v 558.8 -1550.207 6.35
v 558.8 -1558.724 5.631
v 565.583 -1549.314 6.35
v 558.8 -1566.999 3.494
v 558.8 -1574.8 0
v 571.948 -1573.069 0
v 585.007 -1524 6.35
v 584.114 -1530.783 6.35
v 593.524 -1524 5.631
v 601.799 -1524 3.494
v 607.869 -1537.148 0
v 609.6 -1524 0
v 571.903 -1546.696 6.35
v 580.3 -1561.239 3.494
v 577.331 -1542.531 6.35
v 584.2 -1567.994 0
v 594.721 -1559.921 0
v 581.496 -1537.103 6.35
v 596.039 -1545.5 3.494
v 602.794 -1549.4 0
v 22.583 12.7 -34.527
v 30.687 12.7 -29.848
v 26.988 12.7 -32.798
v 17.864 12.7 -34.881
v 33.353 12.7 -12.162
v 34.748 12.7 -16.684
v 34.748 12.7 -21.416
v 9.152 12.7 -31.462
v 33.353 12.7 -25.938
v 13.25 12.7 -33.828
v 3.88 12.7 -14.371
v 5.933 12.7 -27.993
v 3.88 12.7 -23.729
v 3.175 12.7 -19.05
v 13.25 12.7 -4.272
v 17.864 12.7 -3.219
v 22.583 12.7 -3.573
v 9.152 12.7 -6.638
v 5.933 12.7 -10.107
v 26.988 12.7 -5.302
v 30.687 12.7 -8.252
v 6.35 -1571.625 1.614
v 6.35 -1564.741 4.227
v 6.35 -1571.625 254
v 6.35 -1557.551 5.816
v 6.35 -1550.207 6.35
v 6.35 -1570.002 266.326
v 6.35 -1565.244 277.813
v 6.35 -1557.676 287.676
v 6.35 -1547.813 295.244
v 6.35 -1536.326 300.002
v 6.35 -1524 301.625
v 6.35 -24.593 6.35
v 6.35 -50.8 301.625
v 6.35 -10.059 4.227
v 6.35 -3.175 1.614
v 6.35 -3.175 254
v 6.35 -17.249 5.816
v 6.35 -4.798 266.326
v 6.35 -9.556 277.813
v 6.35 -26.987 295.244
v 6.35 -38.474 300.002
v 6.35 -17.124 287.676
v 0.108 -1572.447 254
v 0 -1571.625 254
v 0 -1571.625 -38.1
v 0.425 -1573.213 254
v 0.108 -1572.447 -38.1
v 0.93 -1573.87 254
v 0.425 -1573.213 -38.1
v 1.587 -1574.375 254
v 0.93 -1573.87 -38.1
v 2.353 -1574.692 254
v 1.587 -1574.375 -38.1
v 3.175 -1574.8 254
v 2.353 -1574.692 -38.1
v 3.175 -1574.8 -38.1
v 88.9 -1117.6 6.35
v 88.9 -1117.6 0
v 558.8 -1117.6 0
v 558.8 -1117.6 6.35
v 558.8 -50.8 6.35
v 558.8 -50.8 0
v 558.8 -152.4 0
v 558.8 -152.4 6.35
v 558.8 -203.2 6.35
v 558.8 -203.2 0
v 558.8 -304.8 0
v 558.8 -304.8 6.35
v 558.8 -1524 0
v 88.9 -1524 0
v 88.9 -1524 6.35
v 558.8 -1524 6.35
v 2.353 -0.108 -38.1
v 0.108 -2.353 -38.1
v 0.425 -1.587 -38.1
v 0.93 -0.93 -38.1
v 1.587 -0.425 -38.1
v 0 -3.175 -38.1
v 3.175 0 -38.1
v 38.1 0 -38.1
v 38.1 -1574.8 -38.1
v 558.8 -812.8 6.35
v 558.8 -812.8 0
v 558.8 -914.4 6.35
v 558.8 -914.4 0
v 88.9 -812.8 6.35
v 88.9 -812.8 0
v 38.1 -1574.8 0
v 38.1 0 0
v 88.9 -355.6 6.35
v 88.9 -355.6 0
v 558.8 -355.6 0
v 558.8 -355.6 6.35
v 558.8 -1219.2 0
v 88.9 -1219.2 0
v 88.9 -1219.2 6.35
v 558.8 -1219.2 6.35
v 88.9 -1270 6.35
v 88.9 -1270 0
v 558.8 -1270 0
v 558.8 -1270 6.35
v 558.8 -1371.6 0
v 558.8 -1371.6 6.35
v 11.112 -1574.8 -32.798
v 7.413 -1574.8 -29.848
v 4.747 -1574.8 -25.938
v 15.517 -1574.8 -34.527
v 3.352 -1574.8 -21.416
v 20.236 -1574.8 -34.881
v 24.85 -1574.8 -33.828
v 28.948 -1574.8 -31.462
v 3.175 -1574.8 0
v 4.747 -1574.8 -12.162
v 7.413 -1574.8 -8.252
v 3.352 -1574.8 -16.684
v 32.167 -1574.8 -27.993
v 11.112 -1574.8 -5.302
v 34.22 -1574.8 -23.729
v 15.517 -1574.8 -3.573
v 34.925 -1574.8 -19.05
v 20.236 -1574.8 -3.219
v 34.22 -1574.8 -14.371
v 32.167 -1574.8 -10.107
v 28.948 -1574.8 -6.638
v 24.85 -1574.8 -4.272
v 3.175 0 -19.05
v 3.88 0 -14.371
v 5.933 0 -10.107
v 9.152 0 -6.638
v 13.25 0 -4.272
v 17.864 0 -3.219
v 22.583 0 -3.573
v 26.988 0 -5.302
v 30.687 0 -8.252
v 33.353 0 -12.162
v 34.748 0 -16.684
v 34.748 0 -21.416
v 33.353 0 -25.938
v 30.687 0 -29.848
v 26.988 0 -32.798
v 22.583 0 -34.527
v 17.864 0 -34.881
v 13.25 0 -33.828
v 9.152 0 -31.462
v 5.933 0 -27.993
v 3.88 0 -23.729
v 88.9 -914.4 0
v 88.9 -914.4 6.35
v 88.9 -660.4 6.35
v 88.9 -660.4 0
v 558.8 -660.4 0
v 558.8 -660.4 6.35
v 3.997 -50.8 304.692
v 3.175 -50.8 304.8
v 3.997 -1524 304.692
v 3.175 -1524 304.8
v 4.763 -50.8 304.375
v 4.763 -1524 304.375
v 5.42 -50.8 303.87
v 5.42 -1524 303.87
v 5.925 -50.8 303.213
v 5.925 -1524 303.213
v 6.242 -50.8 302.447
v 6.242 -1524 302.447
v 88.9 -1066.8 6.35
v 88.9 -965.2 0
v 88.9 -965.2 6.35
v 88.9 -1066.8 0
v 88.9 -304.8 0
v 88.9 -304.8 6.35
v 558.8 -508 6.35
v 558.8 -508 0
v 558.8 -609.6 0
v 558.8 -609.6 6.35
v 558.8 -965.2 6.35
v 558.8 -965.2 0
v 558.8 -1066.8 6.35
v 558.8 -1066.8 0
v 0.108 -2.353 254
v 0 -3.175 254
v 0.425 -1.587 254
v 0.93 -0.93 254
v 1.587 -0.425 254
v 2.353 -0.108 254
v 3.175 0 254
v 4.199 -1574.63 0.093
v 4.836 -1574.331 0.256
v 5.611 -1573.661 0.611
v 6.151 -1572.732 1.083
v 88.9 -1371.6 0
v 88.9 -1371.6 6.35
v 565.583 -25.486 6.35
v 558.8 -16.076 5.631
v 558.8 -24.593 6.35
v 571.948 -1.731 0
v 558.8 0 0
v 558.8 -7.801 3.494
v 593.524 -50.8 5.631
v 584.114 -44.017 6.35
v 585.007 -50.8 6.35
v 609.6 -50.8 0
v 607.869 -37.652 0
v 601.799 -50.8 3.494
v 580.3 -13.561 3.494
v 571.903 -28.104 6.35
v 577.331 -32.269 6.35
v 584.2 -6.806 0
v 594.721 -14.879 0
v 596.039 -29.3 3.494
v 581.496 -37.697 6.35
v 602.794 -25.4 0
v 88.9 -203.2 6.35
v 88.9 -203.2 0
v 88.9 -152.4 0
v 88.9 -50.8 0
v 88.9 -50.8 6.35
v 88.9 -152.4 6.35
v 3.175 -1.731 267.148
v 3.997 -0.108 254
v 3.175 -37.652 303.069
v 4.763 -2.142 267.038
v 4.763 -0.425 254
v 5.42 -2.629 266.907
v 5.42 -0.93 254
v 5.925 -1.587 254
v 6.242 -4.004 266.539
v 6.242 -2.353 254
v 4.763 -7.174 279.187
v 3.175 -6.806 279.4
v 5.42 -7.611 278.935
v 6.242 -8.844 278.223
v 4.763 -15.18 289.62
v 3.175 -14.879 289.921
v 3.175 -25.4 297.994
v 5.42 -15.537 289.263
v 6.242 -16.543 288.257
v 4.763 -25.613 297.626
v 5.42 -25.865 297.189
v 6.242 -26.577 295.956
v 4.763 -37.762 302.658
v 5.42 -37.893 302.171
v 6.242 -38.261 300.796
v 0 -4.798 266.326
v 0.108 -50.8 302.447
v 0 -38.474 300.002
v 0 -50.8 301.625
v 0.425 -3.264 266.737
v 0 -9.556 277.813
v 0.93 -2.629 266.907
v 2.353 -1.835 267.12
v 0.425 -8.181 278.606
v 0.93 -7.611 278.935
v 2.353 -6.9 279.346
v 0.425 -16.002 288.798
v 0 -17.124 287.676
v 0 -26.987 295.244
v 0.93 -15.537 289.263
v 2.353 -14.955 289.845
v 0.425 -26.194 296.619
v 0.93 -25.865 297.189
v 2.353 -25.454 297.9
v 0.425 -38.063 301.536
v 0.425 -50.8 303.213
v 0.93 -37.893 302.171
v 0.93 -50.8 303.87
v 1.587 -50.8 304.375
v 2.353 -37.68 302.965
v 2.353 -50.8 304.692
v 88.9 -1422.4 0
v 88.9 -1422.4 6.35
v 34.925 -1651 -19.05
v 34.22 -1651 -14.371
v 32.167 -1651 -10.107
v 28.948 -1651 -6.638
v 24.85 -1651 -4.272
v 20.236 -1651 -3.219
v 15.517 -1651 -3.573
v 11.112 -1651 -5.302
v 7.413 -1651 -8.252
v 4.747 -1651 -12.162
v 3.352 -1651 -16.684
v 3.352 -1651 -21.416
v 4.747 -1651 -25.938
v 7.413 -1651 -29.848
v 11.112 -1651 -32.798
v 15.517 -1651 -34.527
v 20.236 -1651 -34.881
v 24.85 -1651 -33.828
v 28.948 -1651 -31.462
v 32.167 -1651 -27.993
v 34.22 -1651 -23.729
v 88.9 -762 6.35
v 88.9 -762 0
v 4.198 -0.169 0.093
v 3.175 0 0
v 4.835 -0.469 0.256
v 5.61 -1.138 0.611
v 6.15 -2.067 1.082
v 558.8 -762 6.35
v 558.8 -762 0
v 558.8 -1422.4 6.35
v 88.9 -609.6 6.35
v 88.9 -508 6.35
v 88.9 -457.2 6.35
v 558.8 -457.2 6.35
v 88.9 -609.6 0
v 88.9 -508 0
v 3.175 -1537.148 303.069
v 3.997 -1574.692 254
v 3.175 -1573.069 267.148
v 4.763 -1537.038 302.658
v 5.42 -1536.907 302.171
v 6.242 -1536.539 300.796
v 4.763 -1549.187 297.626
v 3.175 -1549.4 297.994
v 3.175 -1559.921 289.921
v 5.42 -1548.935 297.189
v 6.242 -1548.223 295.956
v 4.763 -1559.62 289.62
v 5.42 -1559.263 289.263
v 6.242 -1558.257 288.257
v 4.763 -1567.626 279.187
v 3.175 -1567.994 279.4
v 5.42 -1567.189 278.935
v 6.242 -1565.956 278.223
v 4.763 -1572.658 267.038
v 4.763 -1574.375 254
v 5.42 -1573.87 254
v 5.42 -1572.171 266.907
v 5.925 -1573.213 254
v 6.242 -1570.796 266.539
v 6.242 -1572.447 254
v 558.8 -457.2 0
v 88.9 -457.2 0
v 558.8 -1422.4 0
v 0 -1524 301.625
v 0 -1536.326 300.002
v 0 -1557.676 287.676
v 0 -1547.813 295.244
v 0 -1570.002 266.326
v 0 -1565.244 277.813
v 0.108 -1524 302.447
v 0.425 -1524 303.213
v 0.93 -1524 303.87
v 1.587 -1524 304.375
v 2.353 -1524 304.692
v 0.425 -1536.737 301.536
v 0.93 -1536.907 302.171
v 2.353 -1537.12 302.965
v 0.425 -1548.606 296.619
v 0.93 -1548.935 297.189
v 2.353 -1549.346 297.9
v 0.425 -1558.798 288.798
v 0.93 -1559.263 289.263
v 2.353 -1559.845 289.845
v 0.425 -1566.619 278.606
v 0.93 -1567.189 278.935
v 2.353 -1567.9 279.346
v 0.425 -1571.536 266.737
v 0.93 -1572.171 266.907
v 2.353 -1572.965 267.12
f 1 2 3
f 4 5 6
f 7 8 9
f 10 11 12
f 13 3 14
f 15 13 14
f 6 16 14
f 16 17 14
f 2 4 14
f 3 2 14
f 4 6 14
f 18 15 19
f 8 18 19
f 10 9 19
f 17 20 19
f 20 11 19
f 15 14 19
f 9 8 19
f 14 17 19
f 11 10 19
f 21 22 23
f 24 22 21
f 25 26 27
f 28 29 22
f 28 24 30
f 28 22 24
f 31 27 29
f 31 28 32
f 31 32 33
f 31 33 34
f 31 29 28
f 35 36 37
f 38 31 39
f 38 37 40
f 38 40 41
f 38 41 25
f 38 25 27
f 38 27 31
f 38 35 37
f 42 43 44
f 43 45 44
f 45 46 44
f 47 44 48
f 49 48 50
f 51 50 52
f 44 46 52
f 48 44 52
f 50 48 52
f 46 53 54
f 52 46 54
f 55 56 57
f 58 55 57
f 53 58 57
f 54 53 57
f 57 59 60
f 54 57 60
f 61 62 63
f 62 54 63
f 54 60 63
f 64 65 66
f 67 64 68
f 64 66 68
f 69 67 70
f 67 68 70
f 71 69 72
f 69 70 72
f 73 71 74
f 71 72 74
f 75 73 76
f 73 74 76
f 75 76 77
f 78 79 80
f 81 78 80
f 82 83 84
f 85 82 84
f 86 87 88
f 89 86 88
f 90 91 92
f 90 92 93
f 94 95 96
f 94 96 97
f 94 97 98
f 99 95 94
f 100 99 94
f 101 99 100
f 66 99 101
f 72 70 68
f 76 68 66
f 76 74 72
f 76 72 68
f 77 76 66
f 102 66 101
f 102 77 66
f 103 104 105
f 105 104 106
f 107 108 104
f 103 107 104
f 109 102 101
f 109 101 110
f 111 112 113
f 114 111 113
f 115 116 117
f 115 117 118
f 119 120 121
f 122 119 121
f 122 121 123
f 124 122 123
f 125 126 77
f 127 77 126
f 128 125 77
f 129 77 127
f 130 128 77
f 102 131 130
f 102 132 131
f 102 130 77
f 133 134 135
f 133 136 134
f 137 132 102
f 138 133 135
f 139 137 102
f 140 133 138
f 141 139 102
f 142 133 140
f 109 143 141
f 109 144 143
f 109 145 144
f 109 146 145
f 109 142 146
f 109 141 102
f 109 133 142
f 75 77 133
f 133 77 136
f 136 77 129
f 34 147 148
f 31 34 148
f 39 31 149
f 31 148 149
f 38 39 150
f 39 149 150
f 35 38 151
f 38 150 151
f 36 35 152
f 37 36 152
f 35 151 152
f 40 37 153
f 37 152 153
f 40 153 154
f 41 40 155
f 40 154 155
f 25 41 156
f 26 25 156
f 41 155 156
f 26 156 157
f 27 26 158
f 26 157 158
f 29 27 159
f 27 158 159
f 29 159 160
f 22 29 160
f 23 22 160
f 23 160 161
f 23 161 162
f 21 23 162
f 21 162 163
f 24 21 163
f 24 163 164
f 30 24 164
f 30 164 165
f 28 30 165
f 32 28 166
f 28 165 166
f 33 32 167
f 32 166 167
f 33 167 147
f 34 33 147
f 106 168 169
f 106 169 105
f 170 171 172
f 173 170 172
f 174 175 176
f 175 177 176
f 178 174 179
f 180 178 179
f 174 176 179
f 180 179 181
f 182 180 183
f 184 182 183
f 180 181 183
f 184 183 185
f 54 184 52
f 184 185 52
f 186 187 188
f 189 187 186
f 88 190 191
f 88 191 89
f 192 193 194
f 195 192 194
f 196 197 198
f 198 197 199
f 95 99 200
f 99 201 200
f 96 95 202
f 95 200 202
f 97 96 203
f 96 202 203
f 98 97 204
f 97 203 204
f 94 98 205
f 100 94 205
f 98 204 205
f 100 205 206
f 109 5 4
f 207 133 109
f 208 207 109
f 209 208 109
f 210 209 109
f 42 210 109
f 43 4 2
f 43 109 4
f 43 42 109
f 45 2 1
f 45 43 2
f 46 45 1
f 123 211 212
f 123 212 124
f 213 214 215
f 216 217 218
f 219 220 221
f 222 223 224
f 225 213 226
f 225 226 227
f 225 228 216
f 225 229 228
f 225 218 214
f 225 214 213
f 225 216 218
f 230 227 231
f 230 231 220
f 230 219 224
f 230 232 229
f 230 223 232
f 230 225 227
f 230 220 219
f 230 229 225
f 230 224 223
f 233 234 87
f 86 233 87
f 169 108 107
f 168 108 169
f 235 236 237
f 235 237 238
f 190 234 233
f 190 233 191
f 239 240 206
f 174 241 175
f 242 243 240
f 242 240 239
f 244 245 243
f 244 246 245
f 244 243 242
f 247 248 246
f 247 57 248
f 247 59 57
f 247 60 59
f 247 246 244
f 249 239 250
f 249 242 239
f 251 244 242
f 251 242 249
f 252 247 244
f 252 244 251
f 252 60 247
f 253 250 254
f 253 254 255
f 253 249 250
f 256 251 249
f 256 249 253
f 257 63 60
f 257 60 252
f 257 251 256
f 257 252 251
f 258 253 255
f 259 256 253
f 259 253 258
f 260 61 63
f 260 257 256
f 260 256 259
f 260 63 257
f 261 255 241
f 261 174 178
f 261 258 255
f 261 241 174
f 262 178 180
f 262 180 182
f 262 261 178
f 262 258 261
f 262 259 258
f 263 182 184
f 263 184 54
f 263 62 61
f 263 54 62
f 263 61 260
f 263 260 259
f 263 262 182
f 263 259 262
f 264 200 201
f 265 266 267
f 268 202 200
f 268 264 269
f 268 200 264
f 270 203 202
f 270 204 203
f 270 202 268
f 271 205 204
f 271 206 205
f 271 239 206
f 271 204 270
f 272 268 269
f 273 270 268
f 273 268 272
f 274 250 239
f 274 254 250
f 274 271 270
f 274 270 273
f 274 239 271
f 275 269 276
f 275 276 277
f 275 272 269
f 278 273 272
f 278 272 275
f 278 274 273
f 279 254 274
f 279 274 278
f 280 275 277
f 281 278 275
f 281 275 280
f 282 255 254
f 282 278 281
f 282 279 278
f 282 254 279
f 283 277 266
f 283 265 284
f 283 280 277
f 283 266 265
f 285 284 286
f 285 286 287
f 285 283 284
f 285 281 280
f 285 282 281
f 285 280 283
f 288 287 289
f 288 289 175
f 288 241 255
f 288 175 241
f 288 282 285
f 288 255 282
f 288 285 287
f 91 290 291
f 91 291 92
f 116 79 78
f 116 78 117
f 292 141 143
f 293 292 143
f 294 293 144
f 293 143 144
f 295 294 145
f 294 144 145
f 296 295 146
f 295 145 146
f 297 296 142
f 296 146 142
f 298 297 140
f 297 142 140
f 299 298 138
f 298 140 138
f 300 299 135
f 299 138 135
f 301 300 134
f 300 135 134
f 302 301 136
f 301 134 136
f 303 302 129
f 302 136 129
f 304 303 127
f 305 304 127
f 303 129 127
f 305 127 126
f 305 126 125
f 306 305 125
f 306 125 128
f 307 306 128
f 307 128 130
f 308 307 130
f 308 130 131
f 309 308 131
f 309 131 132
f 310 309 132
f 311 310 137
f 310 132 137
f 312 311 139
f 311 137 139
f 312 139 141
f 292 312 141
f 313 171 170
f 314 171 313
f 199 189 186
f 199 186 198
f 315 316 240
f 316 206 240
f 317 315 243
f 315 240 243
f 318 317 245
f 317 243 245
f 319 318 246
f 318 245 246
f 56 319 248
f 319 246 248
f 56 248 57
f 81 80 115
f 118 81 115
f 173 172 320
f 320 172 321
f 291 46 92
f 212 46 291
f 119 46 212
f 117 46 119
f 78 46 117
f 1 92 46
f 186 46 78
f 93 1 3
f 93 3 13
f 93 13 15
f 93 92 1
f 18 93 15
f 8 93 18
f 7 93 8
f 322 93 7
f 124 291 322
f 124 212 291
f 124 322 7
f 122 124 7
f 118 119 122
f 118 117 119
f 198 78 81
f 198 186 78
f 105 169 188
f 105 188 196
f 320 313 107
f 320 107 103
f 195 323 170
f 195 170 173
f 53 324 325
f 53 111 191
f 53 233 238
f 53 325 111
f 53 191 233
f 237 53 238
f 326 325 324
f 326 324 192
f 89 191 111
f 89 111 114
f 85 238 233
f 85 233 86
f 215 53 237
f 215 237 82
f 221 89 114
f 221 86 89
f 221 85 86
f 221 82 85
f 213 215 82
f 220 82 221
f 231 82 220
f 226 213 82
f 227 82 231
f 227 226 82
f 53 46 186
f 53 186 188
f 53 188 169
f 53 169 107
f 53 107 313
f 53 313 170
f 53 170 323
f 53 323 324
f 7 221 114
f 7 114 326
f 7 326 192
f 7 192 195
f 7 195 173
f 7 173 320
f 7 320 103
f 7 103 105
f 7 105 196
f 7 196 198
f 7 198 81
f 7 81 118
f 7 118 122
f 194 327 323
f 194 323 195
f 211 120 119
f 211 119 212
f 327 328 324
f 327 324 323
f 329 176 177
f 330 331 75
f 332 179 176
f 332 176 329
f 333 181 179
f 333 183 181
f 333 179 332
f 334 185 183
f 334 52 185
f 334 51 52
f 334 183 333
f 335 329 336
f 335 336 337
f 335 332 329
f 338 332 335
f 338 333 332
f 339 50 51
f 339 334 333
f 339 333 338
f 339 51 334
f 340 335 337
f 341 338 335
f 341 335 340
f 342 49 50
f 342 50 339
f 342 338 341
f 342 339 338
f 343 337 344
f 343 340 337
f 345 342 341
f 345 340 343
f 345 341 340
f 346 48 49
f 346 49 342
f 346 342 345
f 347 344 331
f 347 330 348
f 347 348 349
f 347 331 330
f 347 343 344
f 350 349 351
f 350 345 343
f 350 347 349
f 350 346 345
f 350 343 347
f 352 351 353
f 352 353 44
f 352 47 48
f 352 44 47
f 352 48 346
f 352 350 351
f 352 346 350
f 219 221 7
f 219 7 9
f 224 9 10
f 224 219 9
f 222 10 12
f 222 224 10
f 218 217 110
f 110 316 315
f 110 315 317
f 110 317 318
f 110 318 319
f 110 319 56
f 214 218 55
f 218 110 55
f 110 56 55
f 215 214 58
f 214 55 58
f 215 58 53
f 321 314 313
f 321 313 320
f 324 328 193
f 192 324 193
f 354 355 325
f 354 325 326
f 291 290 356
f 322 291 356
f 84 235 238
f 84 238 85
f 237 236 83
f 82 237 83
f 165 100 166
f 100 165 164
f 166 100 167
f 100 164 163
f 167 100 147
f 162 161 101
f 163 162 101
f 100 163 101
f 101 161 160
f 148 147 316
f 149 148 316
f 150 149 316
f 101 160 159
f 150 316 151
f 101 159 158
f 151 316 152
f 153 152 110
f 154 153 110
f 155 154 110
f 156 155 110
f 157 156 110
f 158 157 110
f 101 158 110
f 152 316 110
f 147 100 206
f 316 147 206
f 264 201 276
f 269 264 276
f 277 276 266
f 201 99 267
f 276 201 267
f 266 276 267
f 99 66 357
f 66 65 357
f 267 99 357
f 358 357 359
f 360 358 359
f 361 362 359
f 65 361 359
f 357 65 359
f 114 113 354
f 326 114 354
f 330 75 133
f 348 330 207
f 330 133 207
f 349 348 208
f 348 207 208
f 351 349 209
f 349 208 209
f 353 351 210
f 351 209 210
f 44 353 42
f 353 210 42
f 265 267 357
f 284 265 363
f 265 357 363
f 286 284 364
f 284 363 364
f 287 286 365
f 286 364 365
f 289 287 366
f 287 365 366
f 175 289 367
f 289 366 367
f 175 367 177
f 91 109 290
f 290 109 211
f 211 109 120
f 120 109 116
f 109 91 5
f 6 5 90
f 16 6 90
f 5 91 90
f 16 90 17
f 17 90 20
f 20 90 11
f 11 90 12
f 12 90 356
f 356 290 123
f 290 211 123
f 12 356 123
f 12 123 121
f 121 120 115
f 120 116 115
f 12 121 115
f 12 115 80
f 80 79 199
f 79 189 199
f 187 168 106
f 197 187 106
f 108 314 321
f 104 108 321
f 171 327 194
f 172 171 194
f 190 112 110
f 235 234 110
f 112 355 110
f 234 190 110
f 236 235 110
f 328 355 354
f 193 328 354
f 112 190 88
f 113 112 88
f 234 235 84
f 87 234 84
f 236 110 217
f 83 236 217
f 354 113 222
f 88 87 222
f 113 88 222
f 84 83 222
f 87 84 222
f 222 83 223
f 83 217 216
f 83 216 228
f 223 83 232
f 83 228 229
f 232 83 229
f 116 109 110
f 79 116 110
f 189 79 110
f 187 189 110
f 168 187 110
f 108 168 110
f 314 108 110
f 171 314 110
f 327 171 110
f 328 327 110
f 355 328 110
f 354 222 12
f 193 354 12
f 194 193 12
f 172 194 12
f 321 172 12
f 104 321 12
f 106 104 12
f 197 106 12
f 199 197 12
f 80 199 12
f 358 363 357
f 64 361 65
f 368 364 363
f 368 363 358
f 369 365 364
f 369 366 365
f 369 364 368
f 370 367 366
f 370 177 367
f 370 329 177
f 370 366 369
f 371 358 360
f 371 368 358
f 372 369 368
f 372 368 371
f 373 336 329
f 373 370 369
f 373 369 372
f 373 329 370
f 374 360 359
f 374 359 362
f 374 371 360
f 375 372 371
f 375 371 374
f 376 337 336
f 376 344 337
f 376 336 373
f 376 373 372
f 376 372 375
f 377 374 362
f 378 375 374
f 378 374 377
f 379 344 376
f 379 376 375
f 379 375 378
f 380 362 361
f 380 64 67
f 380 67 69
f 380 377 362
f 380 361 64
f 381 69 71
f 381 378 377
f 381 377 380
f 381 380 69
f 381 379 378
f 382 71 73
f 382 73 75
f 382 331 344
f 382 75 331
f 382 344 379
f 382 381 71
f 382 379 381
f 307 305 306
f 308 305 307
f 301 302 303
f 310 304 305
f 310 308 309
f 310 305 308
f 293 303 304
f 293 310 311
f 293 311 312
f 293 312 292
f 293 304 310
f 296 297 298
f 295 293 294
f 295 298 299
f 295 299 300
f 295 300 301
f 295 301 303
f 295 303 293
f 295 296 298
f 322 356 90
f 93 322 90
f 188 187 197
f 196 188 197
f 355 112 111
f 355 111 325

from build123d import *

# Parameters (mm, degrees)
F0_W         = 6.35
F0_H         = 298.45
F0_W_2       = 603.25
F0_H_2       = 6.35
F1_DEPTH     = 1574.8
F2_W         = 38.1
F2_H         = 38.1
F3_DEPTH     = 1574.8
F4_R         = 15.875
F5_DEPTH     = 76.2
F6_R         = 15.875
F7_DEPTH     = 12.7
F8_W         = 469.9
F8_H         = 101.6
F9_DEPTH     = 25.4
F10_R        = 50.8
F11_T1_DEPTH = 1473.2
F11_T3_DEPTH = 552.45
F11_T6_ANGLE = 90
F11_T8_ANGLE = 90
F12_R        = 3.17499


# Not quite as in the source:
# - a fillet or chamfer that OpenCascade refuses, or shapes differently, is made with other operations: its cross-section is extruded or revolved along the edge and cut away or added
# - a fillet or chamfer is up to 0.001 mm smaller than in the source, because OpenCascade refuses the exact size


with BuildPart() as f1:
    # F0 (on Front) → F1 (new body)
    with BuildSketch(Plane.XZ):
        with Locations((3.175, 155.575)):
            Rectangle(F0_W, F0_H)
        with Locations((307.975, 3.175)):
            Rectangle(F0_W_2, F0_H_2)
        with Locations((3.175, 3.175)):
            Rectangle(F0_W, F0_H_2)
    extrude(amount=F1_DEPTH)

    # F2 (on face) → F3 (join)
    with BuildSketch(Plane.XZ.offset(1574.8)):
        with Locations((19.05, -19.05)):
            Rectangle(F2_W, F2_H)
    extrude(amount=-F3_DEPTH)

    # F4 (on face) → F5 (join)
    with BuildSketch(Plane.XZ.offset(1574.8)):
        with Locations((19.05, -19.05)):
            Circle(F4_R)
    extrude(amount=F5_DEPTH)

    # F6 (on face) → F7 (join)
    with BuildSketch(Plane(origin=(0, 0, 0), x_dir=(-1, 0, 0), z_dir=(0, 1, 0))):
        with Locations((-19.05, -19.05)):
            Circle(F6_R)
    extrude(amount=F7_DEPTH)

    # F8 (on face) → F9 (cut)
    with BuildSketch(Plane(origin=(0, 0, 0), x_dir=(1, 0, 0), z_dir=(0, 0, -1))):
        with Locations((323.85, 1473.2)):
            Rectangle(F8_W, F8_H)
        with Locations((323.85, 1320.8)):
            Rectangle(F8_W, F8_H)
        with Locations((323.85, 1168.4)):
            Rectangle(F8_W, F8_H)
        with Locations((323.85, 1016)):
            Rectangle(F8_W, F8_H)
        with Locations((323.85, 863.6)):
            Rectangle(F8_W, F8_H)
        with Locations((323.85, 711.2)):
            Rectangle(F8_W, F8_H)
        with Locations((323.85, 558.8)):
            Rectangle(F8_W, F8_H)
        with Locations((323.85, 406.4)):
            Rectangle(F8_W, F8_H)
        with Locations((323.85, 254)):
            Rectangle(F8_W, F8_H)
        with Locations((323.85, 101.6)):
            Rectangle(F8_W, F8_H)
    extrude(amount=-F9_DEPTH, mode=Mode.SUBTRACT)

    # F10
    f10_edges = [f1.edges().sort_by_distance(p)[0] for p in [
        (609.6, 0, 3.175),
        (609.6, -1574.8, 3.175),
        (3.175, -1574.8, 304.8),
        (3.175, 0, 304.8),
    ]]
    fillet(f10_edges, radius=F10_R)

    # F11: fillet of radius 50.8 on 1 edges, made by hand

    # F11_s2 → F11_t1 (cut)
    with BuildSketch(Plane.XZ.offset(50.8)):
        with BuildLine():
            ThreePointArc((585.0065557516, 6.35), (597.7065557516, 4.7368884968), (609.6, 0))
            Line((609.6, 0), (609.6, 6.35))
            Line((609.6, 6.35), (585.0065557516, 6.35))
        make_face()
    extrude(amount=F11_T1_DEPTH, mode=Mode.SUBTRACT)

    # F11_s4 → F11_t3 (cut)
    with BuildSketch(Plane.YZ.offset(6.35)):
        with BuildLine():
            ThreePointArc((-1574.8, 0), (-1562.9065557516, 4.7368884968), (-1550.2065557516, 6.35))
            Line((-1550.2065557516, 6.35), (-1574.8, 6.35))
            Line((-1574.8, 6.35), (-1574.8, 0))
        make_face()
        with BuildLine():
            ThreePointArc((0, 0), (-11.8934442484, 4.7368884968), (-24.5934442484, 6.35))
            Line((-24.5934442484, 6.35), (0, 6.35))
            Line((0, 6.35), (0, 0))
        make_face()
    extrude(amount=F11_T3_DEPTH, mode=Mode.SUBTRACT)

    # F11_s5 → F11_t6 (revolve, cut)
    with BuildSketch(Plane.YZ.offset(558.8)):
        with BuildLine():
            ThreePointArc((-24.5934442484, 6.35), (-11.8934442484, 4.7368884968), (0, 0))
            Line((0, 0), (0, 6.35))
            Line((0, 6.35), (-24.5934442484, 6.35))
        make_face()
    revolve(axis=Axis((558.8, -50.8, 6.35), (0, 0, -1)), revolution_arc=F11_T6_ANGLE, mode=Mode.SUBTRACT)

    # F11_s7 → F11_t8 (revolve, cut)
    with BuildSketch(Plane.YZ.offset(558.8)):
        with BuildLine():
            ThreePointArc((-1550.2065557516, 6.35), (-1562.9065557516, 4.7368884968), (-1574.8, 0))
            Line((-1574.8, 0), (-1574.8, 6.35))
            Line((-1574.8, 6.35), (-1550.2065557516, 6.35))
        make_face()
    revolve(axis=Axis((558.8, -1524, 6.35), (0, 0, 1)), revolution_arc=F11_T8_ANGLE, mode=Mode.SUBTRACT)

    # F12 (radius 3.175 in the source; OpenCascade refuses exactly that, so slightly less here)
    f12_edges = [f1.edges().sort_by_distance(p)[0] for p in [
        (6.35, -787.4, 304.8),
        (0, -787.4, 304.8),
        (0, -14.878976, 289.921024),
        (0, -1559.921024, 289.921024),
        (0, 0, 107.95),
        (0, -1574.8, 107.95),
        (6.35, -14.878976, 289.921024),
        (6.35, -1559.921024, 289.921024),
        (6.35, 0, 127),
        (6.35, -1574.8, 127),
    ]]
    fillet(f12_edges, radius=F12_R)


solid = f1.part
